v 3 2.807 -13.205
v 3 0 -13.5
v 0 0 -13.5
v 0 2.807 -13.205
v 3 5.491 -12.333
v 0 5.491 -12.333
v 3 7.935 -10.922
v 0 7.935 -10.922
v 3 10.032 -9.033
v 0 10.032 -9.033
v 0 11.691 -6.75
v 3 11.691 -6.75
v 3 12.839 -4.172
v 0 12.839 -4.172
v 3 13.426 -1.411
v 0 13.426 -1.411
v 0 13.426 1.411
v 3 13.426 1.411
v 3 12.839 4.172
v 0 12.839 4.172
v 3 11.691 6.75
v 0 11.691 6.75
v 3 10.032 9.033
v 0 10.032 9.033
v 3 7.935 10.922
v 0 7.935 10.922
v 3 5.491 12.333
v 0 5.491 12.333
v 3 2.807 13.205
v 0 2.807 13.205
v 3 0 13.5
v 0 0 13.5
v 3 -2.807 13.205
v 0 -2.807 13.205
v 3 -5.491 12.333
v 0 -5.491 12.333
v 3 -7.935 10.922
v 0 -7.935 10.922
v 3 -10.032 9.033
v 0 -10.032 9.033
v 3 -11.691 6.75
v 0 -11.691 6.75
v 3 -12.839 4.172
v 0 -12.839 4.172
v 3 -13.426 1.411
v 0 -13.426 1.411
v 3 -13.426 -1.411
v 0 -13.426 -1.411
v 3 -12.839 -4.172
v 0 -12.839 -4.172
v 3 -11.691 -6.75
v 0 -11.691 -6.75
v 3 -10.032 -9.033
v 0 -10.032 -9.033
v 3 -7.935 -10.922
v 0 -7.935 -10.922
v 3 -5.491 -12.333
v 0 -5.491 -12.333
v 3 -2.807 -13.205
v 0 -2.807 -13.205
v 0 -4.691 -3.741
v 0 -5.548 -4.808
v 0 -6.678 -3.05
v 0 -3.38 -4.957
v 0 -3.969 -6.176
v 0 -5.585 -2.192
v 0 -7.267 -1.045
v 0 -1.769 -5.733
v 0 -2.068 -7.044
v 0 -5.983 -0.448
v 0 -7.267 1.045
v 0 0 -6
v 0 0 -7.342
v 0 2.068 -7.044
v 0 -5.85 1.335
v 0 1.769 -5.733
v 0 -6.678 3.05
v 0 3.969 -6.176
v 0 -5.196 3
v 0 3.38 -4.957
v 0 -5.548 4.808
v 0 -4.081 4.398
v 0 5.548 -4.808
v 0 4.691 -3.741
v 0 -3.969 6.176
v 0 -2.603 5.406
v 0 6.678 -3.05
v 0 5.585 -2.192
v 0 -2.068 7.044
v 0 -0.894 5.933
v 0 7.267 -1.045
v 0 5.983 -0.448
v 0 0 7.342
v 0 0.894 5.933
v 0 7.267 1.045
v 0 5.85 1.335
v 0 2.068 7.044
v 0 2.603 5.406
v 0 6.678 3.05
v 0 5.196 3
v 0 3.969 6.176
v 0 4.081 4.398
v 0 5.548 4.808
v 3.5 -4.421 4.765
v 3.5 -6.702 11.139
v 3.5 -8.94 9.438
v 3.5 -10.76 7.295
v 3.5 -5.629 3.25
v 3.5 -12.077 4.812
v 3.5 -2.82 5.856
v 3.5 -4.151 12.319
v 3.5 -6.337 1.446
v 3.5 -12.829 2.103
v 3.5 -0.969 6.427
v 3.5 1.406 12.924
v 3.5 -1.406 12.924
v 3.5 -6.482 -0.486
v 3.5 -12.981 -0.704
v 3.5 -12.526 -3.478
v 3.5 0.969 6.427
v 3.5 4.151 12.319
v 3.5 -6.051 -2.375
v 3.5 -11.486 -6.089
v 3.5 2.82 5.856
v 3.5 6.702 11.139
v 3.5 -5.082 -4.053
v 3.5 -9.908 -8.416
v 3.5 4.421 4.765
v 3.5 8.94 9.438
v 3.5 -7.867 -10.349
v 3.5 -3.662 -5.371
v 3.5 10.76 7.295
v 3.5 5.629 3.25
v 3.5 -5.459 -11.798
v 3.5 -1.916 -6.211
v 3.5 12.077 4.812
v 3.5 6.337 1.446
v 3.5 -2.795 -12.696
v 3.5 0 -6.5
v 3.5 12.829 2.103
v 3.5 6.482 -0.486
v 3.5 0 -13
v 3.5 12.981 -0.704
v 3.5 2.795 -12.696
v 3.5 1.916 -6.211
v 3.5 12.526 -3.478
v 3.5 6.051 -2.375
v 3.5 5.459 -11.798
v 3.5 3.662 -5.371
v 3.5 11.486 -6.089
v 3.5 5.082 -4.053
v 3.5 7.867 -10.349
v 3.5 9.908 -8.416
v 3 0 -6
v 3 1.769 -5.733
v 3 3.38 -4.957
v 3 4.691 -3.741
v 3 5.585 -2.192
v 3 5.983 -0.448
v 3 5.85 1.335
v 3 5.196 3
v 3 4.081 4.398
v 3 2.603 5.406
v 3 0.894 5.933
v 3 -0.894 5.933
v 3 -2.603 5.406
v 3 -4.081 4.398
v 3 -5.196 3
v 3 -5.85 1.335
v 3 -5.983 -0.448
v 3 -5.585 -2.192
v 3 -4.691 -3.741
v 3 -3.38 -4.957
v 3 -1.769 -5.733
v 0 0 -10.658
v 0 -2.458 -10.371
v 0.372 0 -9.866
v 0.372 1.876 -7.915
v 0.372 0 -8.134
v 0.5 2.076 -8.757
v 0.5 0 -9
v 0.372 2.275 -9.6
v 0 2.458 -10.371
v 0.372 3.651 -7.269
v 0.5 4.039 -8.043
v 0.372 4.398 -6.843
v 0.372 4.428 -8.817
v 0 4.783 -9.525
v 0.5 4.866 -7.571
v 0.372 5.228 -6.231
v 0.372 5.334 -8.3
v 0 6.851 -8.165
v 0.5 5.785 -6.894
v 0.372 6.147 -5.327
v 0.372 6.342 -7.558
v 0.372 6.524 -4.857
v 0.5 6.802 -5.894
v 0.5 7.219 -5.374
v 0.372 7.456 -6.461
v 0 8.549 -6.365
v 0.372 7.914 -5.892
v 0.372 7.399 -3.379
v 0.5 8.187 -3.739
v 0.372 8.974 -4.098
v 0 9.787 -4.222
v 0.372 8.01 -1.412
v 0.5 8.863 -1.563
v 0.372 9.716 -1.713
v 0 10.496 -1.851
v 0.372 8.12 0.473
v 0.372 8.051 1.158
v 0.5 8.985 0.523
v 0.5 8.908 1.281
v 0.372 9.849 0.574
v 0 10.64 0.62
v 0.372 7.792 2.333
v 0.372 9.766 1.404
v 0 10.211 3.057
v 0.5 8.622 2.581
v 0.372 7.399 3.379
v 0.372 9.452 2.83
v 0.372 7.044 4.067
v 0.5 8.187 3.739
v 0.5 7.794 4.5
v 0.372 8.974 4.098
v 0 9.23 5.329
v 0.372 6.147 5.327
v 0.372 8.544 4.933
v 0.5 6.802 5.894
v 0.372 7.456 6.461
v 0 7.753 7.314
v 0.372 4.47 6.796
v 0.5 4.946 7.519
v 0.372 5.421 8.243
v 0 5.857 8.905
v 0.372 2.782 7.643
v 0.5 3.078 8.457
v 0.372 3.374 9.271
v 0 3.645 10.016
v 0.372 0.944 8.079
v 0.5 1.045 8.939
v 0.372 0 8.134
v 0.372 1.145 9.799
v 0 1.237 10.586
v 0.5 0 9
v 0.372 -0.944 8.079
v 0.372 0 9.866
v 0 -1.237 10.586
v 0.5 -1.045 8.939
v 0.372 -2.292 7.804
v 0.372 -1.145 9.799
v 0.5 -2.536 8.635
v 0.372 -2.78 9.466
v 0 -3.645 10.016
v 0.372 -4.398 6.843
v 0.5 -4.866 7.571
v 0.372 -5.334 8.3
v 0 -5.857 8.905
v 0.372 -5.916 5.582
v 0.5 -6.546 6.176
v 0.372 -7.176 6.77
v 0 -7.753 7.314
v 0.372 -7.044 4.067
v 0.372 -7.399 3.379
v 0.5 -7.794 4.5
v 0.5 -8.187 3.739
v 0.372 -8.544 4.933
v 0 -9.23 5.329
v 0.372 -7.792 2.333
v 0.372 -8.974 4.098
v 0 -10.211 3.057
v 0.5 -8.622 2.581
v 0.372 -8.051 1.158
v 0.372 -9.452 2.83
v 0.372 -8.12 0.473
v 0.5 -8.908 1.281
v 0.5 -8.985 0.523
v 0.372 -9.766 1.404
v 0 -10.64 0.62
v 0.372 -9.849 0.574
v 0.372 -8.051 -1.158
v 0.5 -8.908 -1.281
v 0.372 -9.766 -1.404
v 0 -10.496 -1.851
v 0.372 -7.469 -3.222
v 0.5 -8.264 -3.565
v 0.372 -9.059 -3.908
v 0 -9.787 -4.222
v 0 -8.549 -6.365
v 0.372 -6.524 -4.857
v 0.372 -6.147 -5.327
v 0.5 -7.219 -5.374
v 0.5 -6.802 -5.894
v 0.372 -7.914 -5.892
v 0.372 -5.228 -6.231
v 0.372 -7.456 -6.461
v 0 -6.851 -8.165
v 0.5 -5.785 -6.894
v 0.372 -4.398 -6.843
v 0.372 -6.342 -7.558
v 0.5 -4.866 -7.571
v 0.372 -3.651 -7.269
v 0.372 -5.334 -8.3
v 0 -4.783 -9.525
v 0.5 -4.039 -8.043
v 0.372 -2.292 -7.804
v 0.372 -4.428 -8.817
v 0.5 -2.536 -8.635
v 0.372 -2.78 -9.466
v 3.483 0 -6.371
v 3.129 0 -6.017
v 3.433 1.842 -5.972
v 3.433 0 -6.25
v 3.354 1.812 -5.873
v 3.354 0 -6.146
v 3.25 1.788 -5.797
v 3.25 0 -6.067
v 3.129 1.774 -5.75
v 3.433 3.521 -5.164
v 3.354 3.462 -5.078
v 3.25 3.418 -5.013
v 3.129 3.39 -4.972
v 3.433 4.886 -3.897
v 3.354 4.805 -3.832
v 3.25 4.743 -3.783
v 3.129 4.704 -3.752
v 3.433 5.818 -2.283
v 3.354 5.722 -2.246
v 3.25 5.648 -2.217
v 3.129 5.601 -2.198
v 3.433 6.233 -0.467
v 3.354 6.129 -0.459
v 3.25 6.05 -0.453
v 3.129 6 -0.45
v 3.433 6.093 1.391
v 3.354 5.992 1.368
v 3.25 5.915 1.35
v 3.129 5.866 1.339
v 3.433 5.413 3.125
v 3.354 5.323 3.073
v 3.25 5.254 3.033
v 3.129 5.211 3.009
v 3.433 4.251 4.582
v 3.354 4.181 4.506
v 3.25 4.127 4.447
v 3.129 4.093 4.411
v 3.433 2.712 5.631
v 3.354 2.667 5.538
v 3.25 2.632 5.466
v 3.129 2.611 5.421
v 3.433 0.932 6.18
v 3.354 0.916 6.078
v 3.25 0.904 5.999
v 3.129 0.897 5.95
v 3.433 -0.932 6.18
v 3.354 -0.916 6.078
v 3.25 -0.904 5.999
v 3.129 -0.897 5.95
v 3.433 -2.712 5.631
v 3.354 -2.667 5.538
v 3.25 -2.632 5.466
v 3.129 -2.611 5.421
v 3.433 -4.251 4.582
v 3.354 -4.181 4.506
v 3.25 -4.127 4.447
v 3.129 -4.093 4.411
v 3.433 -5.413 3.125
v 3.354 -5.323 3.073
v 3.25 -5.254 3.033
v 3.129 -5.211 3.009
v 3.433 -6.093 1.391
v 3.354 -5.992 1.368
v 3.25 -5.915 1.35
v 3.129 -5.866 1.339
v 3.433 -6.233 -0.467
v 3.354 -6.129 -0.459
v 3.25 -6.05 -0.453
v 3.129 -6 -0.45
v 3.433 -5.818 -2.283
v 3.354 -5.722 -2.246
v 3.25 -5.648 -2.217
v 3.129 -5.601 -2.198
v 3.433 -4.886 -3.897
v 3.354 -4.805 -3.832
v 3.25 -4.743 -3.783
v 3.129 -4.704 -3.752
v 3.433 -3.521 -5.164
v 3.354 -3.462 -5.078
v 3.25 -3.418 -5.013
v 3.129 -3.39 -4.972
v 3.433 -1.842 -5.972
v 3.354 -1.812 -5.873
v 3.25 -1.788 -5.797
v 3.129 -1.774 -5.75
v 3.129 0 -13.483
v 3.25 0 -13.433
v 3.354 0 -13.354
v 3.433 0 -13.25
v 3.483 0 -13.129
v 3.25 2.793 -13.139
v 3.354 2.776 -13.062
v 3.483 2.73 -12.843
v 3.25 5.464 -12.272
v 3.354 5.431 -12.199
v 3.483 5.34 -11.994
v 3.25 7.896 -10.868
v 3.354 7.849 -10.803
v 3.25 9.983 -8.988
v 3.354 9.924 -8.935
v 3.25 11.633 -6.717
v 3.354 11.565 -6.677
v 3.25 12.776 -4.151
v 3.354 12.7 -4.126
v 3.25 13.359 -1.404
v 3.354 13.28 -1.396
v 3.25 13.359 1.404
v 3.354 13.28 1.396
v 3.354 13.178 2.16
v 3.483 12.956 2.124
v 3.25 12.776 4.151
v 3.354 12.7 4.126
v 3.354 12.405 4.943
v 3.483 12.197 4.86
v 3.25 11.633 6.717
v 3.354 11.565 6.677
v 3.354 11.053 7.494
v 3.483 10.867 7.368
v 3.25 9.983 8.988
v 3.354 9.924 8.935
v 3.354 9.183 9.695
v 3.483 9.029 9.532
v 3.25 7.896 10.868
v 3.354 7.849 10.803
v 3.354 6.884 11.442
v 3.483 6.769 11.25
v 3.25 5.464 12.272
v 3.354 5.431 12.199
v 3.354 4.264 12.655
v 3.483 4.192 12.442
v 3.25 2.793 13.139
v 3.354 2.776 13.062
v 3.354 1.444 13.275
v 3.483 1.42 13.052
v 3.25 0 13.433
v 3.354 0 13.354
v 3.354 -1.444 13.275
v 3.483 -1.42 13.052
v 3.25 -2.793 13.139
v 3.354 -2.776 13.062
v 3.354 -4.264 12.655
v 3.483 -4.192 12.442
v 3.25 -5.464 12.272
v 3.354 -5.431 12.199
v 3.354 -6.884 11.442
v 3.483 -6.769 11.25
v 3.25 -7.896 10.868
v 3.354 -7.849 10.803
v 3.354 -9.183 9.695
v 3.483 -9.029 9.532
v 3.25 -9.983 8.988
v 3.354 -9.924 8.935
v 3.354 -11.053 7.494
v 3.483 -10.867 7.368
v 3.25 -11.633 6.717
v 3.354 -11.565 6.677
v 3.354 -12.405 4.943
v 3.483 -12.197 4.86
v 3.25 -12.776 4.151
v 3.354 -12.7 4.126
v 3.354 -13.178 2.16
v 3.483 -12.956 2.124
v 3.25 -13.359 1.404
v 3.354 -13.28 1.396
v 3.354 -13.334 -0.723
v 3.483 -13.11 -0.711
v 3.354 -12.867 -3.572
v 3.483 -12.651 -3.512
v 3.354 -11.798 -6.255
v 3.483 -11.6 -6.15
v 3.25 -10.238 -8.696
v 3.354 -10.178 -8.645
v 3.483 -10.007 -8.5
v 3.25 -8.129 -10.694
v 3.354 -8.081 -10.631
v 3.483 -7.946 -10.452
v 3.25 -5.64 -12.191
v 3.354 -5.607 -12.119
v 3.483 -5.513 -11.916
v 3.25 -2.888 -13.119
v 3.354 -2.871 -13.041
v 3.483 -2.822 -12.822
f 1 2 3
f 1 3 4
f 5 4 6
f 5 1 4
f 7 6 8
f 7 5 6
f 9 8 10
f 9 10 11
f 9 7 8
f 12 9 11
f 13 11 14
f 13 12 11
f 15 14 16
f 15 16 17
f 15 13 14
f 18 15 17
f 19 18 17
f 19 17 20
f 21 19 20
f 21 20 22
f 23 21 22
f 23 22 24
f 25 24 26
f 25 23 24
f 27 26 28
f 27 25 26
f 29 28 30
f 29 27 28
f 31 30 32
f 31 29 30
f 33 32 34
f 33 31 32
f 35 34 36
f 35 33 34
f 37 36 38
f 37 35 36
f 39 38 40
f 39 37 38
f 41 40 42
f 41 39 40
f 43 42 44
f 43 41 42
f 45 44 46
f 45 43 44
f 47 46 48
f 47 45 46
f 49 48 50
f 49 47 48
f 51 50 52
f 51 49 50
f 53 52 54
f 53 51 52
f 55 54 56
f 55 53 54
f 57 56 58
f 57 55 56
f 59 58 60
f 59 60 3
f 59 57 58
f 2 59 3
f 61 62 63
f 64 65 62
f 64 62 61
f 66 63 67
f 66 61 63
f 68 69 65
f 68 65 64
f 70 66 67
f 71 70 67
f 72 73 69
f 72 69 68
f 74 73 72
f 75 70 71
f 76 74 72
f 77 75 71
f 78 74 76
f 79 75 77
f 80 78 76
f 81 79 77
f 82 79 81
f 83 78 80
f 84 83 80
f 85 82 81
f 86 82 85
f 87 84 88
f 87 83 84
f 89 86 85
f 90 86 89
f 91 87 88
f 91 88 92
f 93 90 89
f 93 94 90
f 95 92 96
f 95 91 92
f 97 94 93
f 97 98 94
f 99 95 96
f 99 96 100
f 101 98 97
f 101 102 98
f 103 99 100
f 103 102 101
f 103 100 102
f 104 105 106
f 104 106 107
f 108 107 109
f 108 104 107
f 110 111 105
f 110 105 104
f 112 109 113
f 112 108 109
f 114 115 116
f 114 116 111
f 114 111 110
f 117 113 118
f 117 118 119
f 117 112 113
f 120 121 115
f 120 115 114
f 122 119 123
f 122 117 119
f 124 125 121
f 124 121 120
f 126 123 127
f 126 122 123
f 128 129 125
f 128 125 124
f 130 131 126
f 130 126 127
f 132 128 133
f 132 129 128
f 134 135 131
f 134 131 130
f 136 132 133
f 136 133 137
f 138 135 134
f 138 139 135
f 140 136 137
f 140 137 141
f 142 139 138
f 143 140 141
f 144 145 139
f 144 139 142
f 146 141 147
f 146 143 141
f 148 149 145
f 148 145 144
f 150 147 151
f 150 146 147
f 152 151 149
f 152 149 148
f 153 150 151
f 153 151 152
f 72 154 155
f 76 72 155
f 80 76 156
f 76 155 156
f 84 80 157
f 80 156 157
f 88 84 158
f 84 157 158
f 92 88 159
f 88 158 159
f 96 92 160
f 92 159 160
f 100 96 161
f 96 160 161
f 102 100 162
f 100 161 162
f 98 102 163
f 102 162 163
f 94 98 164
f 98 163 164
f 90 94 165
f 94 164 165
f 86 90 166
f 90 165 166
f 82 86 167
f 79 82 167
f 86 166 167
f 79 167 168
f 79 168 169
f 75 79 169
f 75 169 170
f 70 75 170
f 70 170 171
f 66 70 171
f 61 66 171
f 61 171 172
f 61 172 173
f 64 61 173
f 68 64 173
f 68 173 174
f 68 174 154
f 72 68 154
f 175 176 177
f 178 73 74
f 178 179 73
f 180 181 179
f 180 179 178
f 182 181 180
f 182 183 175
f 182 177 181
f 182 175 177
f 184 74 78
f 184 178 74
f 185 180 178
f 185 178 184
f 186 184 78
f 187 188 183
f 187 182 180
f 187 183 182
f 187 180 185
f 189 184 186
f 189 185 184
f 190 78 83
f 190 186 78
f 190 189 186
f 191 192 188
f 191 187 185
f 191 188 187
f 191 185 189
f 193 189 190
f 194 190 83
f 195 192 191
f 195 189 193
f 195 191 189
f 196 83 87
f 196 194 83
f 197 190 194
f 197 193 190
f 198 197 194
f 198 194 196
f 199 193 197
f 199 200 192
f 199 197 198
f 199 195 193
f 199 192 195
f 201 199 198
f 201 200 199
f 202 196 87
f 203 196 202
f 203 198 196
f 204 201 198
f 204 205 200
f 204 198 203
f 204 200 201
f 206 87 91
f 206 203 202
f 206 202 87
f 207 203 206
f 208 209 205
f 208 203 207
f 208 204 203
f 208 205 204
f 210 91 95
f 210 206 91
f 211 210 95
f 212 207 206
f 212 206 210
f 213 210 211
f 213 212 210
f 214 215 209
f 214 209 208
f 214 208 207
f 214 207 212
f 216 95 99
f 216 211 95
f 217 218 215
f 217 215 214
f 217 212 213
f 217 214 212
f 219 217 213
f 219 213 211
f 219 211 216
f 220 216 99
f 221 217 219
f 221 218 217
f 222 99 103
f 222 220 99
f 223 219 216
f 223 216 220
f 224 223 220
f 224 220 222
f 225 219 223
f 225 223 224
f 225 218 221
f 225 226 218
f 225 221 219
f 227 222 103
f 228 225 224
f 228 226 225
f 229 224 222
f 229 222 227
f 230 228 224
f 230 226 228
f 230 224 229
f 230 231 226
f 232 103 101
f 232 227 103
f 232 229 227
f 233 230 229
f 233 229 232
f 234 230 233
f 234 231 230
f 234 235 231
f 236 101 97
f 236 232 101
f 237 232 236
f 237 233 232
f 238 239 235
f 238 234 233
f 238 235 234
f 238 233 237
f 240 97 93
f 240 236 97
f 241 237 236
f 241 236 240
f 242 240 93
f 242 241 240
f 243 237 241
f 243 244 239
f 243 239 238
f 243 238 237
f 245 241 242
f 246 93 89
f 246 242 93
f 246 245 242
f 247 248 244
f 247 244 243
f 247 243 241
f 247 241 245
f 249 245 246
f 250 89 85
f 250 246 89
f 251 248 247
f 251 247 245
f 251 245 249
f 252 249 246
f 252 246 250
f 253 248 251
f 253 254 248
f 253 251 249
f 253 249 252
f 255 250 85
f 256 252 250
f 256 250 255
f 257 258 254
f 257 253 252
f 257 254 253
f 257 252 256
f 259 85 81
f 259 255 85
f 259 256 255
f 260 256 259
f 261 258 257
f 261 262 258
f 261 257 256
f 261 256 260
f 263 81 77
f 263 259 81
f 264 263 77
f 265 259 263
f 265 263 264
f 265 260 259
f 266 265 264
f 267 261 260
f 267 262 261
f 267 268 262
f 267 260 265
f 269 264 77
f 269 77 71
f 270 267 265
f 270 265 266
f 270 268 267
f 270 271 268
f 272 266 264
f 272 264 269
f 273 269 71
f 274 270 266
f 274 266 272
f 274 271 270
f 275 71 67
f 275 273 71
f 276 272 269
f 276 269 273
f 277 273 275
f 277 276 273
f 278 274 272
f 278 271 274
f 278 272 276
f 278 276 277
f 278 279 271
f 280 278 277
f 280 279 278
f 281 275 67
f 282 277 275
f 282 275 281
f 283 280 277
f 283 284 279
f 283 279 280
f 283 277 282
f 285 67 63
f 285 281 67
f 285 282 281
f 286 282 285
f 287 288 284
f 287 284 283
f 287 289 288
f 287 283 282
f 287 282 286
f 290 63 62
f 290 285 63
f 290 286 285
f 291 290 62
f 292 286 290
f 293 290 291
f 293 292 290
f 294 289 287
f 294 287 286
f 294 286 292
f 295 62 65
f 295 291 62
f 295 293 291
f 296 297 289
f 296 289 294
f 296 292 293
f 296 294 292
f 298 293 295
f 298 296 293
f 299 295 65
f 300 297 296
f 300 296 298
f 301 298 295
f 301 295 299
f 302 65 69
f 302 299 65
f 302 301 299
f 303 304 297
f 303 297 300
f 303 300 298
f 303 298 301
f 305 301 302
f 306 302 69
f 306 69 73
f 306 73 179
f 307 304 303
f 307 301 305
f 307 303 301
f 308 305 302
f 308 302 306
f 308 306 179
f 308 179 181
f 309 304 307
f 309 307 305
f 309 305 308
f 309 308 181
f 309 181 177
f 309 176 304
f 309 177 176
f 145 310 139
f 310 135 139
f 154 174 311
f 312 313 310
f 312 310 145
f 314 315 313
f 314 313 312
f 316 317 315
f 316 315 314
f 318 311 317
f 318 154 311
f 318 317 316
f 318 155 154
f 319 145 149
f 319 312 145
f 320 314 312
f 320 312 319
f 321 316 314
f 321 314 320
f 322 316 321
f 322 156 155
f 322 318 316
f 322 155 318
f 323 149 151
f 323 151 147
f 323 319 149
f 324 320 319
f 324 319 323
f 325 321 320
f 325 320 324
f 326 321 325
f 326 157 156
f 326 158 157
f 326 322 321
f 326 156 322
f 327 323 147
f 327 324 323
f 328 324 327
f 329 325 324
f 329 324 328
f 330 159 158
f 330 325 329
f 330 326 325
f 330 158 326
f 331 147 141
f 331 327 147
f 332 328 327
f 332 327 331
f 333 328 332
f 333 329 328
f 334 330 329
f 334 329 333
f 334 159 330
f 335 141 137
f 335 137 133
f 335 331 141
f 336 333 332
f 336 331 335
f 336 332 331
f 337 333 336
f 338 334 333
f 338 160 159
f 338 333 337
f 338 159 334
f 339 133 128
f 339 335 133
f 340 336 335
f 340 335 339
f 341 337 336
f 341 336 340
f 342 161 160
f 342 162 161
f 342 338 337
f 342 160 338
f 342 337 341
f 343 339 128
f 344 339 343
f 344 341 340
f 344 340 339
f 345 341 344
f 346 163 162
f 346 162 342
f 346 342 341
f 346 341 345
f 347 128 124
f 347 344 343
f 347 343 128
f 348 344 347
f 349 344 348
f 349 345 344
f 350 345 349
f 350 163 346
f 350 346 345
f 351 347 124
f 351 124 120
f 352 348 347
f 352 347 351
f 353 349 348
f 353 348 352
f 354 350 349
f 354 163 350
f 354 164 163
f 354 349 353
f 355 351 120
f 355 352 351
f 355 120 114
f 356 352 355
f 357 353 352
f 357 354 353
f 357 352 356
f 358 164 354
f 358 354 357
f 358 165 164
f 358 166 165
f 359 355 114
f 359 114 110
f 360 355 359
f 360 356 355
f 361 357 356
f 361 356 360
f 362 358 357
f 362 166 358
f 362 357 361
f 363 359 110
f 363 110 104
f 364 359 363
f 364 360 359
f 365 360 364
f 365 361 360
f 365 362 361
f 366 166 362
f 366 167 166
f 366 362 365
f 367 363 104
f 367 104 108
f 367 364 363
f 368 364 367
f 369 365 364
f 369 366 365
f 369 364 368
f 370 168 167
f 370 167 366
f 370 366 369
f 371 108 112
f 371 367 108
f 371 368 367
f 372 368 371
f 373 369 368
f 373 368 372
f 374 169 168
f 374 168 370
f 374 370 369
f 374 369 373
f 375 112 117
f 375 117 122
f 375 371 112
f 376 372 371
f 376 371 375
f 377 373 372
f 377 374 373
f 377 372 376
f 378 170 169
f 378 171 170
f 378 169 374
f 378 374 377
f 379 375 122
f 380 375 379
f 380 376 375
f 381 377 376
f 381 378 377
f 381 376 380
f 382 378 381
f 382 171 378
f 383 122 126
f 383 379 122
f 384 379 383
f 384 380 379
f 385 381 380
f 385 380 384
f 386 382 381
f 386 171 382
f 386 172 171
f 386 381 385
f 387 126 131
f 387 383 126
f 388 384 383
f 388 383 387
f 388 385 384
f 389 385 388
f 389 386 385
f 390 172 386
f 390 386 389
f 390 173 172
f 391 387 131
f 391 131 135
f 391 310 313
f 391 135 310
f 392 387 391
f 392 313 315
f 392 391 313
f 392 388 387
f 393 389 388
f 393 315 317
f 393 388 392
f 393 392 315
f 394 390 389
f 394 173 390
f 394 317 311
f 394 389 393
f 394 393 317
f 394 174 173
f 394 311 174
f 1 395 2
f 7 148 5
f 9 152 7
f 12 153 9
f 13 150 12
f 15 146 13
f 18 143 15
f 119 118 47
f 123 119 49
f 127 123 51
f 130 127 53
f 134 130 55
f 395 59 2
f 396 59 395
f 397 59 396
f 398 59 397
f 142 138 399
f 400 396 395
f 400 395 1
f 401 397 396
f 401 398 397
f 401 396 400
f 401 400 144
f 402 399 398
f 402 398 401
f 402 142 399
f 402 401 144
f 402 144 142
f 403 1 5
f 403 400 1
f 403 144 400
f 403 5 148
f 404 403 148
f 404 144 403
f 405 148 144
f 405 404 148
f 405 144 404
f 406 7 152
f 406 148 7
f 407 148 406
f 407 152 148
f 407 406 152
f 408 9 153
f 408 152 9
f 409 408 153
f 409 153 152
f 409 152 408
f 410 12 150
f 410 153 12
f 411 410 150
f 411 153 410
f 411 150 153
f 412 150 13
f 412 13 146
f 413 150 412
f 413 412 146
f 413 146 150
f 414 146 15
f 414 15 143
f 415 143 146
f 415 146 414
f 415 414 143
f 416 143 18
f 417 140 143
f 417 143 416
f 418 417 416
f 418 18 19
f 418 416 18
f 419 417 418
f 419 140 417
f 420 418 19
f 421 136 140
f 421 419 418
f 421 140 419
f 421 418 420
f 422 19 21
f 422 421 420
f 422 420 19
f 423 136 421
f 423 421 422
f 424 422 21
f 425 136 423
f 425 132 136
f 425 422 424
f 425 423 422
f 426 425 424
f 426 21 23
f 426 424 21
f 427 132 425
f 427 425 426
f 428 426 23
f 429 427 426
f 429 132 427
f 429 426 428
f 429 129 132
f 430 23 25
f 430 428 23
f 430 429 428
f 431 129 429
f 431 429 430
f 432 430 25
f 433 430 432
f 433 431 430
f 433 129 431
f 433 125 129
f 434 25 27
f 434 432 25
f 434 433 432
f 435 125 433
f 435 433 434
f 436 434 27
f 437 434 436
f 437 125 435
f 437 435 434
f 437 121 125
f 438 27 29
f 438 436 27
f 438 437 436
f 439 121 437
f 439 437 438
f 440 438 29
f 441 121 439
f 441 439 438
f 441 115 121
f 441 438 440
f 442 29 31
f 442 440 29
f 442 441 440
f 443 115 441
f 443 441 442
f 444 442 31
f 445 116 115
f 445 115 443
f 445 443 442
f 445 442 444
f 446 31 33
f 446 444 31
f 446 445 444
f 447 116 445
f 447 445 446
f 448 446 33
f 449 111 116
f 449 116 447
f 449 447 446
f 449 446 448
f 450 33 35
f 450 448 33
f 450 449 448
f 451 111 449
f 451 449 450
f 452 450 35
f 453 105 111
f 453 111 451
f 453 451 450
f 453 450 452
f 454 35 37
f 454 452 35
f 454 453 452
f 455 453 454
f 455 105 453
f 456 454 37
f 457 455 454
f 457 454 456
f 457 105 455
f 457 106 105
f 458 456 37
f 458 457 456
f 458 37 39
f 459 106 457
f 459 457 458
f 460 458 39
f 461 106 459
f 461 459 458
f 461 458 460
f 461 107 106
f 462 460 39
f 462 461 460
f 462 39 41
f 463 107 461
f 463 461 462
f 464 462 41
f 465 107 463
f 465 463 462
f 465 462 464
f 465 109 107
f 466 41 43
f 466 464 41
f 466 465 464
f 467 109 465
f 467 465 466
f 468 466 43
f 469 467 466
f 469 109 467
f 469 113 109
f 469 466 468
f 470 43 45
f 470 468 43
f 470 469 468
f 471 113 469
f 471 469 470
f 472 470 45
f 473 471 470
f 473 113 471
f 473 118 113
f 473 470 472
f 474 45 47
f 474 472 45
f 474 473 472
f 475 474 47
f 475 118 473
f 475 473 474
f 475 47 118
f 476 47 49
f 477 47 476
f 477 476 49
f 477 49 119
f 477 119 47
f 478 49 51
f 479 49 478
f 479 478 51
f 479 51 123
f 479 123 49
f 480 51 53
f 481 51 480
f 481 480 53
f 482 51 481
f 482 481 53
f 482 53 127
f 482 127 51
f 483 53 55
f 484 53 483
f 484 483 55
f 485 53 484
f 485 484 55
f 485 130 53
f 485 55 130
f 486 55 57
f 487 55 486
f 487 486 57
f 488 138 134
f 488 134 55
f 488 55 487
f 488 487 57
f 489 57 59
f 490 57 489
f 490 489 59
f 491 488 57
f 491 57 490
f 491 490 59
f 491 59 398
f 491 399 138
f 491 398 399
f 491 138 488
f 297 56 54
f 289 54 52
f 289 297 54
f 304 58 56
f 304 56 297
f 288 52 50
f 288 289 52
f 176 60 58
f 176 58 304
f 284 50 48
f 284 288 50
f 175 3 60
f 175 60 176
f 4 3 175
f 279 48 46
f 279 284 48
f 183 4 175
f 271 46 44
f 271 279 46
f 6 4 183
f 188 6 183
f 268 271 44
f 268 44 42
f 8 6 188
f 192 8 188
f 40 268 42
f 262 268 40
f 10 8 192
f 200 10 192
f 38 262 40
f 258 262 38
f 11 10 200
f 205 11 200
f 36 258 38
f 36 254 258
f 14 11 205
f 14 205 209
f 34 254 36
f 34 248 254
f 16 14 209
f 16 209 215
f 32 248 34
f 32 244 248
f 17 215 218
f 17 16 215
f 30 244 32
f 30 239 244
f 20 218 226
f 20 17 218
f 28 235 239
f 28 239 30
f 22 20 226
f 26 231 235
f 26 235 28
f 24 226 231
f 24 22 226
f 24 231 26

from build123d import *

# Parameters (mm, degrees)
CONG_1_R                = 0.5
ESQUISSE2_R             = 6
ENL_V_MAT_EXTRU_1_DEPTH = 20.410049083
CONG_2_R                = 0.5


with BuildPart() as part:
    # Esquisse1 → Base-Révolution (revolve)
    with BuildSketch(Plane.XY, mode=Mode.PRIVATE) as base_r_volution_sk:
        with BuildLine():
            Line((0, 0), (0, 7.341687605))
            ThreePointArc((0, 7.341687605), (0.5, 9), (0, 10.658312395))
            Line((0, 10.658312395), (0, 13.5))
            Line((0, 13.5), (3.5, 13.5))
            Line((3.5, 13.5), (3.5, 0))
            Line((3.5, 0), (0, 0))
        make_face()
    revolve(base_r_volution_sk.sketch.rotate(Axis((-2.5, 0, 0), (1, 0, 0)), 270), axis=Axis((-2.5, 0, 0), (1, 0, 0)))

    # Congé1
    cong_1_edges = [part.edges().sort_by_distance(p)[0] for p in [
        (3.5, 0, 13.5),
    ]]
    fillet(cong_1_edges, radius=CONG_1_R)

    # Esquisse2 → Enlèv. mat.-Extru.1 (cut, through all)
    with BuildSketch(Plane(origin=(3.5, 0, 0), x_dir=(0, 0, -1), z_dir=(1, 0, 0))):
        Circle(ESQUISSE2_R)
    extrude(amount=-ENL_V_MAT_EXTRU_1_DEPTH, mode=Mode.SUBTRACT)

    # Congé2
    cong_2_edges = [part.edges().sort_by_distance(p)[0] for p in [
        (3.5, 0, 6),
    ]]
    fillet(cong_2_edges, radius=CONG_2_R)


solid = part.part
